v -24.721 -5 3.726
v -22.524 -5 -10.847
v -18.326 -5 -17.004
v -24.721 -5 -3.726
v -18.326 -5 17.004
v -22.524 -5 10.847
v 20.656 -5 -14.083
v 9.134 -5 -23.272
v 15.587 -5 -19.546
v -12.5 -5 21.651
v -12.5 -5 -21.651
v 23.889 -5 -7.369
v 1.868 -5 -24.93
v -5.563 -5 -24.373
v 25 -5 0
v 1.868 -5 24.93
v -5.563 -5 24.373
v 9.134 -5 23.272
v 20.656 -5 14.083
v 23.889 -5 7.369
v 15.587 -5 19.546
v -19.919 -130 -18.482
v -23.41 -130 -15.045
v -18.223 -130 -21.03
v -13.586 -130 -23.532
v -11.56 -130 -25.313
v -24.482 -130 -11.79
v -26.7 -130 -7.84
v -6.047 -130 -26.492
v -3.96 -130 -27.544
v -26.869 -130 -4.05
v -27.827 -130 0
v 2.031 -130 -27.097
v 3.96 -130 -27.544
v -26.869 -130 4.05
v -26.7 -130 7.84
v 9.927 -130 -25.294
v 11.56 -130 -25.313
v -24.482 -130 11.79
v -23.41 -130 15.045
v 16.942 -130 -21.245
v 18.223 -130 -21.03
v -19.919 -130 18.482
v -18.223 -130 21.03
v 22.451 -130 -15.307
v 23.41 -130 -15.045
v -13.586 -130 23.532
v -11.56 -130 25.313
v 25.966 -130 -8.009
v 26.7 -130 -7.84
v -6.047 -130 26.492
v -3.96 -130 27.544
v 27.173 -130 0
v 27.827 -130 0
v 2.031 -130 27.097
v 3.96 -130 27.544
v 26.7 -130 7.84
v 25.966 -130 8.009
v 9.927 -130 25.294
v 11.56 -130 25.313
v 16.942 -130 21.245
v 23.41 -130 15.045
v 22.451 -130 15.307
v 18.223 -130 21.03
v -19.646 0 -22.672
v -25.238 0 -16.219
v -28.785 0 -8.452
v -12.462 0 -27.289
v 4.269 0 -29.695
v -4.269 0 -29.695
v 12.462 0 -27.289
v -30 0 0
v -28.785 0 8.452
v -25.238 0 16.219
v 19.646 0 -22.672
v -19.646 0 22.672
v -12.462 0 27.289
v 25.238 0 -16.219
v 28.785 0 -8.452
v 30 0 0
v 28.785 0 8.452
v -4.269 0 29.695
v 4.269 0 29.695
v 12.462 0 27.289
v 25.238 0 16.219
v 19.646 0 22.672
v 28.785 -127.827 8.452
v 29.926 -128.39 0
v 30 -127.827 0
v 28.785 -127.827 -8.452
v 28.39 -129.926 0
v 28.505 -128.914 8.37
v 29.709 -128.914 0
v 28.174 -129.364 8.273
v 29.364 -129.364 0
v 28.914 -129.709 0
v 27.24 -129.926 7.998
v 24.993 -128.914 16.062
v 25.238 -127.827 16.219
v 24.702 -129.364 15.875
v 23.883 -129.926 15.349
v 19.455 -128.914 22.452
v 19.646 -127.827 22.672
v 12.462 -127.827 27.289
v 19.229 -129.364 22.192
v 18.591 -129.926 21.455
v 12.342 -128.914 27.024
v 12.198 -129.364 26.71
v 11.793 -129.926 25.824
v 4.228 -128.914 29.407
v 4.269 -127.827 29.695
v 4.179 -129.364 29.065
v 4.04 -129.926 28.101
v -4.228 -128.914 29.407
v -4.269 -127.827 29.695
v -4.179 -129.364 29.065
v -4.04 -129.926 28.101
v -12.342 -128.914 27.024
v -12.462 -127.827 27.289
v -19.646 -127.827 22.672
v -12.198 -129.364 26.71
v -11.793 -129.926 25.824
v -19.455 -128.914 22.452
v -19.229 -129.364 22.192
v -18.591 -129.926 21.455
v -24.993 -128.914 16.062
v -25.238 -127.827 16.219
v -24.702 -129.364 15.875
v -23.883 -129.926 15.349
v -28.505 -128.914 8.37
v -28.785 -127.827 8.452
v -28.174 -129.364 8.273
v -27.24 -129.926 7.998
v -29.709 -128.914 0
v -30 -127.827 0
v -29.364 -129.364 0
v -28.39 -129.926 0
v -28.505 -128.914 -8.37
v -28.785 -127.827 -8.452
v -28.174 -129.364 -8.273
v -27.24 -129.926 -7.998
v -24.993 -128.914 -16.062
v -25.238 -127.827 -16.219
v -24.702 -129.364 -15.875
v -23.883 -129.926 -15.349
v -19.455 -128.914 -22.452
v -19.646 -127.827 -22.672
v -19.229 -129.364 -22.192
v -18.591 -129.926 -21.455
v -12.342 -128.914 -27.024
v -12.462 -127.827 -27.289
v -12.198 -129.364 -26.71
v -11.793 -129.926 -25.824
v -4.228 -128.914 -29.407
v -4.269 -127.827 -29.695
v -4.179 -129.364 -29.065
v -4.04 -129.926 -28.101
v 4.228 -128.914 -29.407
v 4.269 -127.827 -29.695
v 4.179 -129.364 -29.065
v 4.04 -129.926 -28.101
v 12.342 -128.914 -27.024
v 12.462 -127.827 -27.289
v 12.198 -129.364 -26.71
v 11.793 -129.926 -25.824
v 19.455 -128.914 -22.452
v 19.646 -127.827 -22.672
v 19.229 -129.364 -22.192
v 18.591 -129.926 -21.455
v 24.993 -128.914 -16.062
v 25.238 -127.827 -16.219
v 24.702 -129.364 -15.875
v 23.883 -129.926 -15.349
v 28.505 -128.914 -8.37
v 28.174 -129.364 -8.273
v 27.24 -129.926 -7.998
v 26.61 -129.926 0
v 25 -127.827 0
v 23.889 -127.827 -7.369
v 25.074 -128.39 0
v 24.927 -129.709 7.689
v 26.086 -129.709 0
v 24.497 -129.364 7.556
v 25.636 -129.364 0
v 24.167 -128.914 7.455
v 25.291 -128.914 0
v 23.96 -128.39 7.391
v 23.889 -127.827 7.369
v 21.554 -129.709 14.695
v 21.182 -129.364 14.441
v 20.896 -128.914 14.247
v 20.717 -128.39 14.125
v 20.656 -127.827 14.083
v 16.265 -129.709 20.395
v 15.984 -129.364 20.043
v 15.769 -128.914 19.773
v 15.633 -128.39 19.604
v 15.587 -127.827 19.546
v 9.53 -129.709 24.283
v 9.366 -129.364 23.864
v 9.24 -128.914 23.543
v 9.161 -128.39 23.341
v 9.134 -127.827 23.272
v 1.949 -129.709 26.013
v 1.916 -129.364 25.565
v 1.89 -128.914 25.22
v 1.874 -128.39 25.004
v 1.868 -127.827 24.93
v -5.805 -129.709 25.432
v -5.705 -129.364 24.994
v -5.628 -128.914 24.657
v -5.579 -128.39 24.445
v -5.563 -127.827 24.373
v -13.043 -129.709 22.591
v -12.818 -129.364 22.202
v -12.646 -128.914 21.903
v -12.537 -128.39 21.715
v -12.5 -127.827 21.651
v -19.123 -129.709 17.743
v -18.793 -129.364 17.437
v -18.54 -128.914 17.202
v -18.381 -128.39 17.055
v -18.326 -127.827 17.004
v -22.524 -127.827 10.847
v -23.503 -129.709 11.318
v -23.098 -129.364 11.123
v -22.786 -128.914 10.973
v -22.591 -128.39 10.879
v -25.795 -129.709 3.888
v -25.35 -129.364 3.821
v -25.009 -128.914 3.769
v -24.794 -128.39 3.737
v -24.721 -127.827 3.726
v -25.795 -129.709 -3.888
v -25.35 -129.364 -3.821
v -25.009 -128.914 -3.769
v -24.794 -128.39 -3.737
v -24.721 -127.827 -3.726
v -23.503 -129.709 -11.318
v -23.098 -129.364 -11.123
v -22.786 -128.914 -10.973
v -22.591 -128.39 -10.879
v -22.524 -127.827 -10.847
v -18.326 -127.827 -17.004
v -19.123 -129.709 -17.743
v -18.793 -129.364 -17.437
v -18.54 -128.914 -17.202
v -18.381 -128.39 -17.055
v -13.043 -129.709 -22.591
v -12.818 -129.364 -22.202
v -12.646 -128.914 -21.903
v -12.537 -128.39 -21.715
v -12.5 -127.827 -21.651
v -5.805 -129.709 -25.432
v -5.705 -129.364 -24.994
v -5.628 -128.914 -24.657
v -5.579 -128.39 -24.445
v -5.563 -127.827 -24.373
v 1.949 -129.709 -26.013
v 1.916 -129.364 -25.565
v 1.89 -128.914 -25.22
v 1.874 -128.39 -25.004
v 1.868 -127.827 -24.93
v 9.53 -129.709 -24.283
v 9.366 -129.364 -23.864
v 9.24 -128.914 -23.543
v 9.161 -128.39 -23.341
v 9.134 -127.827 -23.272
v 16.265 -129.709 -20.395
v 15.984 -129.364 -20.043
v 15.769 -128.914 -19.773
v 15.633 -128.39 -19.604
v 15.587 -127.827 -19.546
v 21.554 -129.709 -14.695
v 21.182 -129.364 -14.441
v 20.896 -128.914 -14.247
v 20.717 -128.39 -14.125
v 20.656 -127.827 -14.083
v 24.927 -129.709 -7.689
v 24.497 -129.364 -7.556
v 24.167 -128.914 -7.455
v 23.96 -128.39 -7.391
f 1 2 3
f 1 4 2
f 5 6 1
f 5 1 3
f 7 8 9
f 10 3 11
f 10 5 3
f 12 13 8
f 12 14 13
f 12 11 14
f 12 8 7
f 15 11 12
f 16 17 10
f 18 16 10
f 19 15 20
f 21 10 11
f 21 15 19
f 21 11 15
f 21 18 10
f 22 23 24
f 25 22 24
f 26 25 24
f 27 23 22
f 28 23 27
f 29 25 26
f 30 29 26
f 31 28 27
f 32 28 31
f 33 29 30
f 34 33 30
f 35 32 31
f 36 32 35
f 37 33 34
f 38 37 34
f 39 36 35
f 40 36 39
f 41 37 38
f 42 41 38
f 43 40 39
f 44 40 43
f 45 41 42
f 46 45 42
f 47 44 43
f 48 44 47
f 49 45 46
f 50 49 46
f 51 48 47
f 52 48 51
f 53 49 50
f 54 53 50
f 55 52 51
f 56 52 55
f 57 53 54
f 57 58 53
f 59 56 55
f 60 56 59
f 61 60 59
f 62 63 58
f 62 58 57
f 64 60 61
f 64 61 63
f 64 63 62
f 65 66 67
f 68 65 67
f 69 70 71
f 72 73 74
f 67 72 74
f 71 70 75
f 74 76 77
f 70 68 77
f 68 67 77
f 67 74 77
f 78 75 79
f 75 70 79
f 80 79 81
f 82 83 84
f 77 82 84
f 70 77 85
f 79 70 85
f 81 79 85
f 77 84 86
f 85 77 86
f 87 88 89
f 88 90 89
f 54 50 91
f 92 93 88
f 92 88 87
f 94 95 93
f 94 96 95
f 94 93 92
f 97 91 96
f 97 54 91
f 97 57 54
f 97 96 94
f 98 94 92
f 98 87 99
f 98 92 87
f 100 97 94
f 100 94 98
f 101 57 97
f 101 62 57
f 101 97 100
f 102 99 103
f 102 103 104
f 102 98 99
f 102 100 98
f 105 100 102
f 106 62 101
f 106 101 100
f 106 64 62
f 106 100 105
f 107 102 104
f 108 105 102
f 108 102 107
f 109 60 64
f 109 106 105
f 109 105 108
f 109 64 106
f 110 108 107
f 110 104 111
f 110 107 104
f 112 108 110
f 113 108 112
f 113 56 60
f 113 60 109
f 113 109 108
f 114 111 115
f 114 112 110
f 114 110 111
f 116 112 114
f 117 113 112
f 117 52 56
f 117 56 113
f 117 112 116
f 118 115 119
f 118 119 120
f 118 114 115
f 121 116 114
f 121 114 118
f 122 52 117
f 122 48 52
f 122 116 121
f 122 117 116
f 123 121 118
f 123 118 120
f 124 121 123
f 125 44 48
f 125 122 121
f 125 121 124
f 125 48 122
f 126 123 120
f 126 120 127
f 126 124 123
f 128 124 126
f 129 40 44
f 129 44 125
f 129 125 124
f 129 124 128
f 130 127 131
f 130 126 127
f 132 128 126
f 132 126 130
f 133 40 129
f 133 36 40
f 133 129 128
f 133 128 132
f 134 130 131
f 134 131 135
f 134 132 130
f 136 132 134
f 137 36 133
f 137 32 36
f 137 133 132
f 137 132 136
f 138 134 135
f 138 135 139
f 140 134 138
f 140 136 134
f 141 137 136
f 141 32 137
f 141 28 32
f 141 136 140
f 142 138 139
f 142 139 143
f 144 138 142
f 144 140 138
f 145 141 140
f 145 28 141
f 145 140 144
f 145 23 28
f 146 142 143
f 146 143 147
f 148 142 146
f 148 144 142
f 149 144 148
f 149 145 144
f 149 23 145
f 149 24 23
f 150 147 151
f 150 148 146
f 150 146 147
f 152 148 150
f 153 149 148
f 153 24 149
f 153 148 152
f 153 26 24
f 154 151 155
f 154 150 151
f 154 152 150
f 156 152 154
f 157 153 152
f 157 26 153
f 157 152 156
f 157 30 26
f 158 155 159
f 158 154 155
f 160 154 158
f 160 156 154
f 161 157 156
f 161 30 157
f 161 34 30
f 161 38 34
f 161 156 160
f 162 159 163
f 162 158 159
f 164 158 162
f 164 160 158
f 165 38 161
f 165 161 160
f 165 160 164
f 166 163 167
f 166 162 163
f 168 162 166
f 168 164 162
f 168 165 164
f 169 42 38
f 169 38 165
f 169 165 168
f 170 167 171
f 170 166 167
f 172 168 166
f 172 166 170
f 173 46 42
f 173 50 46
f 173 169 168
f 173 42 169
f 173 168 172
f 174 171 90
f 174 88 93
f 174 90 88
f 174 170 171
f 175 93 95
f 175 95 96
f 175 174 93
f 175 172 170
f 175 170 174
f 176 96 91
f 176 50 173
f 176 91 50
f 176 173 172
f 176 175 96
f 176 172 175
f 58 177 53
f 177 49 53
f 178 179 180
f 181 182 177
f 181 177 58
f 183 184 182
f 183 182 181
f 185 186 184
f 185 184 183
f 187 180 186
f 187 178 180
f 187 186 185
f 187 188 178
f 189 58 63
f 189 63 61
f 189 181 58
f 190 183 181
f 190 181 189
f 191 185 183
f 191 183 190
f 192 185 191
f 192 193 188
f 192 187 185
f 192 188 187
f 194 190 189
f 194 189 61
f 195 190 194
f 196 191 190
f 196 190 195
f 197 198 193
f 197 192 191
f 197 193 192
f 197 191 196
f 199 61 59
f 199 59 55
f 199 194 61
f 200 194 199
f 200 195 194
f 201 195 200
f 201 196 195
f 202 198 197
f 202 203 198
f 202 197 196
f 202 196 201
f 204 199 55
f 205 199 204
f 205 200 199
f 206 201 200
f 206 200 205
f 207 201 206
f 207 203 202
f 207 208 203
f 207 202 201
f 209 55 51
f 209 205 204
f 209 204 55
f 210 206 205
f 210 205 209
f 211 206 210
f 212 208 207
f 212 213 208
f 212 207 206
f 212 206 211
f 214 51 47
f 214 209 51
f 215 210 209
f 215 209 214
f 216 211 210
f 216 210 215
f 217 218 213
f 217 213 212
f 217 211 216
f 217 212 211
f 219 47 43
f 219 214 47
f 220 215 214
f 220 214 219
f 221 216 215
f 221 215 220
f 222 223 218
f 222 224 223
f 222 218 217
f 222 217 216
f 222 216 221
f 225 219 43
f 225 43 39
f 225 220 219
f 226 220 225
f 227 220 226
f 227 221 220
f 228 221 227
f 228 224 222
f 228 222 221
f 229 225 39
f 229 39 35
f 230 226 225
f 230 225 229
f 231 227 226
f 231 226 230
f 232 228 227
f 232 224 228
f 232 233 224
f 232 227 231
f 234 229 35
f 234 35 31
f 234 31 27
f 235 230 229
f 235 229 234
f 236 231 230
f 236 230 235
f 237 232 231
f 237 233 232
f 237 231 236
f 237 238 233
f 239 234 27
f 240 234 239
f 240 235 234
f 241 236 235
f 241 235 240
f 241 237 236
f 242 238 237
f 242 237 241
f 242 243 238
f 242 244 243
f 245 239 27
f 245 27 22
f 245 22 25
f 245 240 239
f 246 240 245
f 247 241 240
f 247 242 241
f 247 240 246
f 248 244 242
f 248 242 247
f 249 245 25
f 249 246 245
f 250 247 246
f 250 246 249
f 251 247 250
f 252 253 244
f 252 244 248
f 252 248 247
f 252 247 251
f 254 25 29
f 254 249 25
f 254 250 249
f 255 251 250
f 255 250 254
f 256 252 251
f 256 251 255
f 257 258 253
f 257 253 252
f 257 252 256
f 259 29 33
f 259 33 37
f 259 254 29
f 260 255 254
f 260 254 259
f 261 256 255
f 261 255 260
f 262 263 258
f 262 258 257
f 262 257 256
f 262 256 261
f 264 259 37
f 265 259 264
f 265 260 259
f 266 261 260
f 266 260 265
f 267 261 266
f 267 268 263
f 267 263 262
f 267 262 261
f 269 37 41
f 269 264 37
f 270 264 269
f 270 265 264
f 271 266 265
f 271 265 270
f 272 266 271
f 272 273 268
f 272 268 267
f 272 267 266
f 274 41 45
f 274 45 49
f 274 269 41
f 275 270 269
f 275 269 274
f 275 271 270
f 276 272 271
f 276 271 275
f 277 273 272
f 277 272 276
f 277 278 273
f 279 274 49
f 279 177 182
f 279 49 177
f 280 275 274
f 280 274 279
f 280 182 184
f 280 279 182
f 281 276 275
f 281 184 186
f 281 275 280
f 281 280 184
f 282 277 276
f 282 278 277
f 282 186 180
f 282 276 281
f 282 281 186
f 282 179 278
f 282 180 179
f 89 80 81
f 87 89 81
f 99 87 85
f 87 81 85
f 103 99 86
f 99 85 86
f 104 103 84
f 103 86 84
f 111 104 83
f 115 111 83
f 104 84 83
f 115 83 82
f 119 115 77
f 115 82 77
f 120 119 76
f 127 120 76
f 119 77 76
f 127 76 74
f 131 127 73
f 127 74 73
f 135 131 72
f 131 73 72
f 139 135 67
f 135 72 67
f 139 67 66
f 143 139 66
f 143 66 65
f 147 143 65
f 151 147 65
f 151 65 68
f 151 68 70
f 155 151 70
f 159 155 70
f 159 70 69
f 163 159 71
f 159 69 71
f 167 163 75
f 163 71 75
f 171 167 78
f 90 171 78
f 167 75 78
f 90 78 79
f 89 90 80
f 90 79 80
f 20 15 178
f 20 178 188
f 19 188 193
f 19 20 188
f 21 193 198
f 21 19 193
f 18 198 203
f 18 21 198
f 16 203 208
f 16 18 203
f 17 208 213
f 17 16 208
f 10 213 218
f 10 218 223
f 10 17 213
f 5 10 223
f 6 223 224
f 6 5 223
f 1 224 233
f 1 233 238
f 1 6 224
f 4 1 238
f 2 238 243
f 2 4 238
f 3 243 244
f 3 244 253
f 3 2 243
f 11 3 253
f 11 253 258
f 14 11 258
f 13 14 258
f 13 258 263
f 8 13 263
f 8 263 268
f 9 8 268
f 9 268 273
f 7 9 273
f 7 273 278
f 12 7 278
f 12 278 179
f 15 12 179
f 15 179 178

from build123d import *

# Parameters (mm, degrees)
F0_R     = 30
F0_R_2   = 25
F1_DEPTH = 5
F2_DEPTH = 130
F3_R     = 2.172792
F4_R     = 2.172792


with BuildPart() as f1:
    # F0 (on Front) → F1 (new body)
    with BuildSketch(Plane.XZ):
        Circle(F0_R)
        Circle(F0_R_2, mode=Mode.SUBTRACT)
        Circle(F0_R_2)
    extrude(amount=F1_DEPTH)

    # F0 (on Front) → F2 (join)
    with BuildSketch(Plane.XZ):
        Circle(F0_R)
        Circle(F0_R_2, mode=Mode.SUBTRACT)
    extrude(amount=F2_DEPTH)

    # F3
    f3_edges = [f1.edges().sort_by_distance(p)[0] for p in [
        (-30, -130, 0),
    ]]
    fillet(f3_edges, radius=F3_R)

    # F4
    f4_edges = [f1.edges().sort_by_distance(p)[0] for p in [
        (-25, -130, 0),
    ]]
    fillet(f4_edges, radius=F4_R)


solid = f1.part
